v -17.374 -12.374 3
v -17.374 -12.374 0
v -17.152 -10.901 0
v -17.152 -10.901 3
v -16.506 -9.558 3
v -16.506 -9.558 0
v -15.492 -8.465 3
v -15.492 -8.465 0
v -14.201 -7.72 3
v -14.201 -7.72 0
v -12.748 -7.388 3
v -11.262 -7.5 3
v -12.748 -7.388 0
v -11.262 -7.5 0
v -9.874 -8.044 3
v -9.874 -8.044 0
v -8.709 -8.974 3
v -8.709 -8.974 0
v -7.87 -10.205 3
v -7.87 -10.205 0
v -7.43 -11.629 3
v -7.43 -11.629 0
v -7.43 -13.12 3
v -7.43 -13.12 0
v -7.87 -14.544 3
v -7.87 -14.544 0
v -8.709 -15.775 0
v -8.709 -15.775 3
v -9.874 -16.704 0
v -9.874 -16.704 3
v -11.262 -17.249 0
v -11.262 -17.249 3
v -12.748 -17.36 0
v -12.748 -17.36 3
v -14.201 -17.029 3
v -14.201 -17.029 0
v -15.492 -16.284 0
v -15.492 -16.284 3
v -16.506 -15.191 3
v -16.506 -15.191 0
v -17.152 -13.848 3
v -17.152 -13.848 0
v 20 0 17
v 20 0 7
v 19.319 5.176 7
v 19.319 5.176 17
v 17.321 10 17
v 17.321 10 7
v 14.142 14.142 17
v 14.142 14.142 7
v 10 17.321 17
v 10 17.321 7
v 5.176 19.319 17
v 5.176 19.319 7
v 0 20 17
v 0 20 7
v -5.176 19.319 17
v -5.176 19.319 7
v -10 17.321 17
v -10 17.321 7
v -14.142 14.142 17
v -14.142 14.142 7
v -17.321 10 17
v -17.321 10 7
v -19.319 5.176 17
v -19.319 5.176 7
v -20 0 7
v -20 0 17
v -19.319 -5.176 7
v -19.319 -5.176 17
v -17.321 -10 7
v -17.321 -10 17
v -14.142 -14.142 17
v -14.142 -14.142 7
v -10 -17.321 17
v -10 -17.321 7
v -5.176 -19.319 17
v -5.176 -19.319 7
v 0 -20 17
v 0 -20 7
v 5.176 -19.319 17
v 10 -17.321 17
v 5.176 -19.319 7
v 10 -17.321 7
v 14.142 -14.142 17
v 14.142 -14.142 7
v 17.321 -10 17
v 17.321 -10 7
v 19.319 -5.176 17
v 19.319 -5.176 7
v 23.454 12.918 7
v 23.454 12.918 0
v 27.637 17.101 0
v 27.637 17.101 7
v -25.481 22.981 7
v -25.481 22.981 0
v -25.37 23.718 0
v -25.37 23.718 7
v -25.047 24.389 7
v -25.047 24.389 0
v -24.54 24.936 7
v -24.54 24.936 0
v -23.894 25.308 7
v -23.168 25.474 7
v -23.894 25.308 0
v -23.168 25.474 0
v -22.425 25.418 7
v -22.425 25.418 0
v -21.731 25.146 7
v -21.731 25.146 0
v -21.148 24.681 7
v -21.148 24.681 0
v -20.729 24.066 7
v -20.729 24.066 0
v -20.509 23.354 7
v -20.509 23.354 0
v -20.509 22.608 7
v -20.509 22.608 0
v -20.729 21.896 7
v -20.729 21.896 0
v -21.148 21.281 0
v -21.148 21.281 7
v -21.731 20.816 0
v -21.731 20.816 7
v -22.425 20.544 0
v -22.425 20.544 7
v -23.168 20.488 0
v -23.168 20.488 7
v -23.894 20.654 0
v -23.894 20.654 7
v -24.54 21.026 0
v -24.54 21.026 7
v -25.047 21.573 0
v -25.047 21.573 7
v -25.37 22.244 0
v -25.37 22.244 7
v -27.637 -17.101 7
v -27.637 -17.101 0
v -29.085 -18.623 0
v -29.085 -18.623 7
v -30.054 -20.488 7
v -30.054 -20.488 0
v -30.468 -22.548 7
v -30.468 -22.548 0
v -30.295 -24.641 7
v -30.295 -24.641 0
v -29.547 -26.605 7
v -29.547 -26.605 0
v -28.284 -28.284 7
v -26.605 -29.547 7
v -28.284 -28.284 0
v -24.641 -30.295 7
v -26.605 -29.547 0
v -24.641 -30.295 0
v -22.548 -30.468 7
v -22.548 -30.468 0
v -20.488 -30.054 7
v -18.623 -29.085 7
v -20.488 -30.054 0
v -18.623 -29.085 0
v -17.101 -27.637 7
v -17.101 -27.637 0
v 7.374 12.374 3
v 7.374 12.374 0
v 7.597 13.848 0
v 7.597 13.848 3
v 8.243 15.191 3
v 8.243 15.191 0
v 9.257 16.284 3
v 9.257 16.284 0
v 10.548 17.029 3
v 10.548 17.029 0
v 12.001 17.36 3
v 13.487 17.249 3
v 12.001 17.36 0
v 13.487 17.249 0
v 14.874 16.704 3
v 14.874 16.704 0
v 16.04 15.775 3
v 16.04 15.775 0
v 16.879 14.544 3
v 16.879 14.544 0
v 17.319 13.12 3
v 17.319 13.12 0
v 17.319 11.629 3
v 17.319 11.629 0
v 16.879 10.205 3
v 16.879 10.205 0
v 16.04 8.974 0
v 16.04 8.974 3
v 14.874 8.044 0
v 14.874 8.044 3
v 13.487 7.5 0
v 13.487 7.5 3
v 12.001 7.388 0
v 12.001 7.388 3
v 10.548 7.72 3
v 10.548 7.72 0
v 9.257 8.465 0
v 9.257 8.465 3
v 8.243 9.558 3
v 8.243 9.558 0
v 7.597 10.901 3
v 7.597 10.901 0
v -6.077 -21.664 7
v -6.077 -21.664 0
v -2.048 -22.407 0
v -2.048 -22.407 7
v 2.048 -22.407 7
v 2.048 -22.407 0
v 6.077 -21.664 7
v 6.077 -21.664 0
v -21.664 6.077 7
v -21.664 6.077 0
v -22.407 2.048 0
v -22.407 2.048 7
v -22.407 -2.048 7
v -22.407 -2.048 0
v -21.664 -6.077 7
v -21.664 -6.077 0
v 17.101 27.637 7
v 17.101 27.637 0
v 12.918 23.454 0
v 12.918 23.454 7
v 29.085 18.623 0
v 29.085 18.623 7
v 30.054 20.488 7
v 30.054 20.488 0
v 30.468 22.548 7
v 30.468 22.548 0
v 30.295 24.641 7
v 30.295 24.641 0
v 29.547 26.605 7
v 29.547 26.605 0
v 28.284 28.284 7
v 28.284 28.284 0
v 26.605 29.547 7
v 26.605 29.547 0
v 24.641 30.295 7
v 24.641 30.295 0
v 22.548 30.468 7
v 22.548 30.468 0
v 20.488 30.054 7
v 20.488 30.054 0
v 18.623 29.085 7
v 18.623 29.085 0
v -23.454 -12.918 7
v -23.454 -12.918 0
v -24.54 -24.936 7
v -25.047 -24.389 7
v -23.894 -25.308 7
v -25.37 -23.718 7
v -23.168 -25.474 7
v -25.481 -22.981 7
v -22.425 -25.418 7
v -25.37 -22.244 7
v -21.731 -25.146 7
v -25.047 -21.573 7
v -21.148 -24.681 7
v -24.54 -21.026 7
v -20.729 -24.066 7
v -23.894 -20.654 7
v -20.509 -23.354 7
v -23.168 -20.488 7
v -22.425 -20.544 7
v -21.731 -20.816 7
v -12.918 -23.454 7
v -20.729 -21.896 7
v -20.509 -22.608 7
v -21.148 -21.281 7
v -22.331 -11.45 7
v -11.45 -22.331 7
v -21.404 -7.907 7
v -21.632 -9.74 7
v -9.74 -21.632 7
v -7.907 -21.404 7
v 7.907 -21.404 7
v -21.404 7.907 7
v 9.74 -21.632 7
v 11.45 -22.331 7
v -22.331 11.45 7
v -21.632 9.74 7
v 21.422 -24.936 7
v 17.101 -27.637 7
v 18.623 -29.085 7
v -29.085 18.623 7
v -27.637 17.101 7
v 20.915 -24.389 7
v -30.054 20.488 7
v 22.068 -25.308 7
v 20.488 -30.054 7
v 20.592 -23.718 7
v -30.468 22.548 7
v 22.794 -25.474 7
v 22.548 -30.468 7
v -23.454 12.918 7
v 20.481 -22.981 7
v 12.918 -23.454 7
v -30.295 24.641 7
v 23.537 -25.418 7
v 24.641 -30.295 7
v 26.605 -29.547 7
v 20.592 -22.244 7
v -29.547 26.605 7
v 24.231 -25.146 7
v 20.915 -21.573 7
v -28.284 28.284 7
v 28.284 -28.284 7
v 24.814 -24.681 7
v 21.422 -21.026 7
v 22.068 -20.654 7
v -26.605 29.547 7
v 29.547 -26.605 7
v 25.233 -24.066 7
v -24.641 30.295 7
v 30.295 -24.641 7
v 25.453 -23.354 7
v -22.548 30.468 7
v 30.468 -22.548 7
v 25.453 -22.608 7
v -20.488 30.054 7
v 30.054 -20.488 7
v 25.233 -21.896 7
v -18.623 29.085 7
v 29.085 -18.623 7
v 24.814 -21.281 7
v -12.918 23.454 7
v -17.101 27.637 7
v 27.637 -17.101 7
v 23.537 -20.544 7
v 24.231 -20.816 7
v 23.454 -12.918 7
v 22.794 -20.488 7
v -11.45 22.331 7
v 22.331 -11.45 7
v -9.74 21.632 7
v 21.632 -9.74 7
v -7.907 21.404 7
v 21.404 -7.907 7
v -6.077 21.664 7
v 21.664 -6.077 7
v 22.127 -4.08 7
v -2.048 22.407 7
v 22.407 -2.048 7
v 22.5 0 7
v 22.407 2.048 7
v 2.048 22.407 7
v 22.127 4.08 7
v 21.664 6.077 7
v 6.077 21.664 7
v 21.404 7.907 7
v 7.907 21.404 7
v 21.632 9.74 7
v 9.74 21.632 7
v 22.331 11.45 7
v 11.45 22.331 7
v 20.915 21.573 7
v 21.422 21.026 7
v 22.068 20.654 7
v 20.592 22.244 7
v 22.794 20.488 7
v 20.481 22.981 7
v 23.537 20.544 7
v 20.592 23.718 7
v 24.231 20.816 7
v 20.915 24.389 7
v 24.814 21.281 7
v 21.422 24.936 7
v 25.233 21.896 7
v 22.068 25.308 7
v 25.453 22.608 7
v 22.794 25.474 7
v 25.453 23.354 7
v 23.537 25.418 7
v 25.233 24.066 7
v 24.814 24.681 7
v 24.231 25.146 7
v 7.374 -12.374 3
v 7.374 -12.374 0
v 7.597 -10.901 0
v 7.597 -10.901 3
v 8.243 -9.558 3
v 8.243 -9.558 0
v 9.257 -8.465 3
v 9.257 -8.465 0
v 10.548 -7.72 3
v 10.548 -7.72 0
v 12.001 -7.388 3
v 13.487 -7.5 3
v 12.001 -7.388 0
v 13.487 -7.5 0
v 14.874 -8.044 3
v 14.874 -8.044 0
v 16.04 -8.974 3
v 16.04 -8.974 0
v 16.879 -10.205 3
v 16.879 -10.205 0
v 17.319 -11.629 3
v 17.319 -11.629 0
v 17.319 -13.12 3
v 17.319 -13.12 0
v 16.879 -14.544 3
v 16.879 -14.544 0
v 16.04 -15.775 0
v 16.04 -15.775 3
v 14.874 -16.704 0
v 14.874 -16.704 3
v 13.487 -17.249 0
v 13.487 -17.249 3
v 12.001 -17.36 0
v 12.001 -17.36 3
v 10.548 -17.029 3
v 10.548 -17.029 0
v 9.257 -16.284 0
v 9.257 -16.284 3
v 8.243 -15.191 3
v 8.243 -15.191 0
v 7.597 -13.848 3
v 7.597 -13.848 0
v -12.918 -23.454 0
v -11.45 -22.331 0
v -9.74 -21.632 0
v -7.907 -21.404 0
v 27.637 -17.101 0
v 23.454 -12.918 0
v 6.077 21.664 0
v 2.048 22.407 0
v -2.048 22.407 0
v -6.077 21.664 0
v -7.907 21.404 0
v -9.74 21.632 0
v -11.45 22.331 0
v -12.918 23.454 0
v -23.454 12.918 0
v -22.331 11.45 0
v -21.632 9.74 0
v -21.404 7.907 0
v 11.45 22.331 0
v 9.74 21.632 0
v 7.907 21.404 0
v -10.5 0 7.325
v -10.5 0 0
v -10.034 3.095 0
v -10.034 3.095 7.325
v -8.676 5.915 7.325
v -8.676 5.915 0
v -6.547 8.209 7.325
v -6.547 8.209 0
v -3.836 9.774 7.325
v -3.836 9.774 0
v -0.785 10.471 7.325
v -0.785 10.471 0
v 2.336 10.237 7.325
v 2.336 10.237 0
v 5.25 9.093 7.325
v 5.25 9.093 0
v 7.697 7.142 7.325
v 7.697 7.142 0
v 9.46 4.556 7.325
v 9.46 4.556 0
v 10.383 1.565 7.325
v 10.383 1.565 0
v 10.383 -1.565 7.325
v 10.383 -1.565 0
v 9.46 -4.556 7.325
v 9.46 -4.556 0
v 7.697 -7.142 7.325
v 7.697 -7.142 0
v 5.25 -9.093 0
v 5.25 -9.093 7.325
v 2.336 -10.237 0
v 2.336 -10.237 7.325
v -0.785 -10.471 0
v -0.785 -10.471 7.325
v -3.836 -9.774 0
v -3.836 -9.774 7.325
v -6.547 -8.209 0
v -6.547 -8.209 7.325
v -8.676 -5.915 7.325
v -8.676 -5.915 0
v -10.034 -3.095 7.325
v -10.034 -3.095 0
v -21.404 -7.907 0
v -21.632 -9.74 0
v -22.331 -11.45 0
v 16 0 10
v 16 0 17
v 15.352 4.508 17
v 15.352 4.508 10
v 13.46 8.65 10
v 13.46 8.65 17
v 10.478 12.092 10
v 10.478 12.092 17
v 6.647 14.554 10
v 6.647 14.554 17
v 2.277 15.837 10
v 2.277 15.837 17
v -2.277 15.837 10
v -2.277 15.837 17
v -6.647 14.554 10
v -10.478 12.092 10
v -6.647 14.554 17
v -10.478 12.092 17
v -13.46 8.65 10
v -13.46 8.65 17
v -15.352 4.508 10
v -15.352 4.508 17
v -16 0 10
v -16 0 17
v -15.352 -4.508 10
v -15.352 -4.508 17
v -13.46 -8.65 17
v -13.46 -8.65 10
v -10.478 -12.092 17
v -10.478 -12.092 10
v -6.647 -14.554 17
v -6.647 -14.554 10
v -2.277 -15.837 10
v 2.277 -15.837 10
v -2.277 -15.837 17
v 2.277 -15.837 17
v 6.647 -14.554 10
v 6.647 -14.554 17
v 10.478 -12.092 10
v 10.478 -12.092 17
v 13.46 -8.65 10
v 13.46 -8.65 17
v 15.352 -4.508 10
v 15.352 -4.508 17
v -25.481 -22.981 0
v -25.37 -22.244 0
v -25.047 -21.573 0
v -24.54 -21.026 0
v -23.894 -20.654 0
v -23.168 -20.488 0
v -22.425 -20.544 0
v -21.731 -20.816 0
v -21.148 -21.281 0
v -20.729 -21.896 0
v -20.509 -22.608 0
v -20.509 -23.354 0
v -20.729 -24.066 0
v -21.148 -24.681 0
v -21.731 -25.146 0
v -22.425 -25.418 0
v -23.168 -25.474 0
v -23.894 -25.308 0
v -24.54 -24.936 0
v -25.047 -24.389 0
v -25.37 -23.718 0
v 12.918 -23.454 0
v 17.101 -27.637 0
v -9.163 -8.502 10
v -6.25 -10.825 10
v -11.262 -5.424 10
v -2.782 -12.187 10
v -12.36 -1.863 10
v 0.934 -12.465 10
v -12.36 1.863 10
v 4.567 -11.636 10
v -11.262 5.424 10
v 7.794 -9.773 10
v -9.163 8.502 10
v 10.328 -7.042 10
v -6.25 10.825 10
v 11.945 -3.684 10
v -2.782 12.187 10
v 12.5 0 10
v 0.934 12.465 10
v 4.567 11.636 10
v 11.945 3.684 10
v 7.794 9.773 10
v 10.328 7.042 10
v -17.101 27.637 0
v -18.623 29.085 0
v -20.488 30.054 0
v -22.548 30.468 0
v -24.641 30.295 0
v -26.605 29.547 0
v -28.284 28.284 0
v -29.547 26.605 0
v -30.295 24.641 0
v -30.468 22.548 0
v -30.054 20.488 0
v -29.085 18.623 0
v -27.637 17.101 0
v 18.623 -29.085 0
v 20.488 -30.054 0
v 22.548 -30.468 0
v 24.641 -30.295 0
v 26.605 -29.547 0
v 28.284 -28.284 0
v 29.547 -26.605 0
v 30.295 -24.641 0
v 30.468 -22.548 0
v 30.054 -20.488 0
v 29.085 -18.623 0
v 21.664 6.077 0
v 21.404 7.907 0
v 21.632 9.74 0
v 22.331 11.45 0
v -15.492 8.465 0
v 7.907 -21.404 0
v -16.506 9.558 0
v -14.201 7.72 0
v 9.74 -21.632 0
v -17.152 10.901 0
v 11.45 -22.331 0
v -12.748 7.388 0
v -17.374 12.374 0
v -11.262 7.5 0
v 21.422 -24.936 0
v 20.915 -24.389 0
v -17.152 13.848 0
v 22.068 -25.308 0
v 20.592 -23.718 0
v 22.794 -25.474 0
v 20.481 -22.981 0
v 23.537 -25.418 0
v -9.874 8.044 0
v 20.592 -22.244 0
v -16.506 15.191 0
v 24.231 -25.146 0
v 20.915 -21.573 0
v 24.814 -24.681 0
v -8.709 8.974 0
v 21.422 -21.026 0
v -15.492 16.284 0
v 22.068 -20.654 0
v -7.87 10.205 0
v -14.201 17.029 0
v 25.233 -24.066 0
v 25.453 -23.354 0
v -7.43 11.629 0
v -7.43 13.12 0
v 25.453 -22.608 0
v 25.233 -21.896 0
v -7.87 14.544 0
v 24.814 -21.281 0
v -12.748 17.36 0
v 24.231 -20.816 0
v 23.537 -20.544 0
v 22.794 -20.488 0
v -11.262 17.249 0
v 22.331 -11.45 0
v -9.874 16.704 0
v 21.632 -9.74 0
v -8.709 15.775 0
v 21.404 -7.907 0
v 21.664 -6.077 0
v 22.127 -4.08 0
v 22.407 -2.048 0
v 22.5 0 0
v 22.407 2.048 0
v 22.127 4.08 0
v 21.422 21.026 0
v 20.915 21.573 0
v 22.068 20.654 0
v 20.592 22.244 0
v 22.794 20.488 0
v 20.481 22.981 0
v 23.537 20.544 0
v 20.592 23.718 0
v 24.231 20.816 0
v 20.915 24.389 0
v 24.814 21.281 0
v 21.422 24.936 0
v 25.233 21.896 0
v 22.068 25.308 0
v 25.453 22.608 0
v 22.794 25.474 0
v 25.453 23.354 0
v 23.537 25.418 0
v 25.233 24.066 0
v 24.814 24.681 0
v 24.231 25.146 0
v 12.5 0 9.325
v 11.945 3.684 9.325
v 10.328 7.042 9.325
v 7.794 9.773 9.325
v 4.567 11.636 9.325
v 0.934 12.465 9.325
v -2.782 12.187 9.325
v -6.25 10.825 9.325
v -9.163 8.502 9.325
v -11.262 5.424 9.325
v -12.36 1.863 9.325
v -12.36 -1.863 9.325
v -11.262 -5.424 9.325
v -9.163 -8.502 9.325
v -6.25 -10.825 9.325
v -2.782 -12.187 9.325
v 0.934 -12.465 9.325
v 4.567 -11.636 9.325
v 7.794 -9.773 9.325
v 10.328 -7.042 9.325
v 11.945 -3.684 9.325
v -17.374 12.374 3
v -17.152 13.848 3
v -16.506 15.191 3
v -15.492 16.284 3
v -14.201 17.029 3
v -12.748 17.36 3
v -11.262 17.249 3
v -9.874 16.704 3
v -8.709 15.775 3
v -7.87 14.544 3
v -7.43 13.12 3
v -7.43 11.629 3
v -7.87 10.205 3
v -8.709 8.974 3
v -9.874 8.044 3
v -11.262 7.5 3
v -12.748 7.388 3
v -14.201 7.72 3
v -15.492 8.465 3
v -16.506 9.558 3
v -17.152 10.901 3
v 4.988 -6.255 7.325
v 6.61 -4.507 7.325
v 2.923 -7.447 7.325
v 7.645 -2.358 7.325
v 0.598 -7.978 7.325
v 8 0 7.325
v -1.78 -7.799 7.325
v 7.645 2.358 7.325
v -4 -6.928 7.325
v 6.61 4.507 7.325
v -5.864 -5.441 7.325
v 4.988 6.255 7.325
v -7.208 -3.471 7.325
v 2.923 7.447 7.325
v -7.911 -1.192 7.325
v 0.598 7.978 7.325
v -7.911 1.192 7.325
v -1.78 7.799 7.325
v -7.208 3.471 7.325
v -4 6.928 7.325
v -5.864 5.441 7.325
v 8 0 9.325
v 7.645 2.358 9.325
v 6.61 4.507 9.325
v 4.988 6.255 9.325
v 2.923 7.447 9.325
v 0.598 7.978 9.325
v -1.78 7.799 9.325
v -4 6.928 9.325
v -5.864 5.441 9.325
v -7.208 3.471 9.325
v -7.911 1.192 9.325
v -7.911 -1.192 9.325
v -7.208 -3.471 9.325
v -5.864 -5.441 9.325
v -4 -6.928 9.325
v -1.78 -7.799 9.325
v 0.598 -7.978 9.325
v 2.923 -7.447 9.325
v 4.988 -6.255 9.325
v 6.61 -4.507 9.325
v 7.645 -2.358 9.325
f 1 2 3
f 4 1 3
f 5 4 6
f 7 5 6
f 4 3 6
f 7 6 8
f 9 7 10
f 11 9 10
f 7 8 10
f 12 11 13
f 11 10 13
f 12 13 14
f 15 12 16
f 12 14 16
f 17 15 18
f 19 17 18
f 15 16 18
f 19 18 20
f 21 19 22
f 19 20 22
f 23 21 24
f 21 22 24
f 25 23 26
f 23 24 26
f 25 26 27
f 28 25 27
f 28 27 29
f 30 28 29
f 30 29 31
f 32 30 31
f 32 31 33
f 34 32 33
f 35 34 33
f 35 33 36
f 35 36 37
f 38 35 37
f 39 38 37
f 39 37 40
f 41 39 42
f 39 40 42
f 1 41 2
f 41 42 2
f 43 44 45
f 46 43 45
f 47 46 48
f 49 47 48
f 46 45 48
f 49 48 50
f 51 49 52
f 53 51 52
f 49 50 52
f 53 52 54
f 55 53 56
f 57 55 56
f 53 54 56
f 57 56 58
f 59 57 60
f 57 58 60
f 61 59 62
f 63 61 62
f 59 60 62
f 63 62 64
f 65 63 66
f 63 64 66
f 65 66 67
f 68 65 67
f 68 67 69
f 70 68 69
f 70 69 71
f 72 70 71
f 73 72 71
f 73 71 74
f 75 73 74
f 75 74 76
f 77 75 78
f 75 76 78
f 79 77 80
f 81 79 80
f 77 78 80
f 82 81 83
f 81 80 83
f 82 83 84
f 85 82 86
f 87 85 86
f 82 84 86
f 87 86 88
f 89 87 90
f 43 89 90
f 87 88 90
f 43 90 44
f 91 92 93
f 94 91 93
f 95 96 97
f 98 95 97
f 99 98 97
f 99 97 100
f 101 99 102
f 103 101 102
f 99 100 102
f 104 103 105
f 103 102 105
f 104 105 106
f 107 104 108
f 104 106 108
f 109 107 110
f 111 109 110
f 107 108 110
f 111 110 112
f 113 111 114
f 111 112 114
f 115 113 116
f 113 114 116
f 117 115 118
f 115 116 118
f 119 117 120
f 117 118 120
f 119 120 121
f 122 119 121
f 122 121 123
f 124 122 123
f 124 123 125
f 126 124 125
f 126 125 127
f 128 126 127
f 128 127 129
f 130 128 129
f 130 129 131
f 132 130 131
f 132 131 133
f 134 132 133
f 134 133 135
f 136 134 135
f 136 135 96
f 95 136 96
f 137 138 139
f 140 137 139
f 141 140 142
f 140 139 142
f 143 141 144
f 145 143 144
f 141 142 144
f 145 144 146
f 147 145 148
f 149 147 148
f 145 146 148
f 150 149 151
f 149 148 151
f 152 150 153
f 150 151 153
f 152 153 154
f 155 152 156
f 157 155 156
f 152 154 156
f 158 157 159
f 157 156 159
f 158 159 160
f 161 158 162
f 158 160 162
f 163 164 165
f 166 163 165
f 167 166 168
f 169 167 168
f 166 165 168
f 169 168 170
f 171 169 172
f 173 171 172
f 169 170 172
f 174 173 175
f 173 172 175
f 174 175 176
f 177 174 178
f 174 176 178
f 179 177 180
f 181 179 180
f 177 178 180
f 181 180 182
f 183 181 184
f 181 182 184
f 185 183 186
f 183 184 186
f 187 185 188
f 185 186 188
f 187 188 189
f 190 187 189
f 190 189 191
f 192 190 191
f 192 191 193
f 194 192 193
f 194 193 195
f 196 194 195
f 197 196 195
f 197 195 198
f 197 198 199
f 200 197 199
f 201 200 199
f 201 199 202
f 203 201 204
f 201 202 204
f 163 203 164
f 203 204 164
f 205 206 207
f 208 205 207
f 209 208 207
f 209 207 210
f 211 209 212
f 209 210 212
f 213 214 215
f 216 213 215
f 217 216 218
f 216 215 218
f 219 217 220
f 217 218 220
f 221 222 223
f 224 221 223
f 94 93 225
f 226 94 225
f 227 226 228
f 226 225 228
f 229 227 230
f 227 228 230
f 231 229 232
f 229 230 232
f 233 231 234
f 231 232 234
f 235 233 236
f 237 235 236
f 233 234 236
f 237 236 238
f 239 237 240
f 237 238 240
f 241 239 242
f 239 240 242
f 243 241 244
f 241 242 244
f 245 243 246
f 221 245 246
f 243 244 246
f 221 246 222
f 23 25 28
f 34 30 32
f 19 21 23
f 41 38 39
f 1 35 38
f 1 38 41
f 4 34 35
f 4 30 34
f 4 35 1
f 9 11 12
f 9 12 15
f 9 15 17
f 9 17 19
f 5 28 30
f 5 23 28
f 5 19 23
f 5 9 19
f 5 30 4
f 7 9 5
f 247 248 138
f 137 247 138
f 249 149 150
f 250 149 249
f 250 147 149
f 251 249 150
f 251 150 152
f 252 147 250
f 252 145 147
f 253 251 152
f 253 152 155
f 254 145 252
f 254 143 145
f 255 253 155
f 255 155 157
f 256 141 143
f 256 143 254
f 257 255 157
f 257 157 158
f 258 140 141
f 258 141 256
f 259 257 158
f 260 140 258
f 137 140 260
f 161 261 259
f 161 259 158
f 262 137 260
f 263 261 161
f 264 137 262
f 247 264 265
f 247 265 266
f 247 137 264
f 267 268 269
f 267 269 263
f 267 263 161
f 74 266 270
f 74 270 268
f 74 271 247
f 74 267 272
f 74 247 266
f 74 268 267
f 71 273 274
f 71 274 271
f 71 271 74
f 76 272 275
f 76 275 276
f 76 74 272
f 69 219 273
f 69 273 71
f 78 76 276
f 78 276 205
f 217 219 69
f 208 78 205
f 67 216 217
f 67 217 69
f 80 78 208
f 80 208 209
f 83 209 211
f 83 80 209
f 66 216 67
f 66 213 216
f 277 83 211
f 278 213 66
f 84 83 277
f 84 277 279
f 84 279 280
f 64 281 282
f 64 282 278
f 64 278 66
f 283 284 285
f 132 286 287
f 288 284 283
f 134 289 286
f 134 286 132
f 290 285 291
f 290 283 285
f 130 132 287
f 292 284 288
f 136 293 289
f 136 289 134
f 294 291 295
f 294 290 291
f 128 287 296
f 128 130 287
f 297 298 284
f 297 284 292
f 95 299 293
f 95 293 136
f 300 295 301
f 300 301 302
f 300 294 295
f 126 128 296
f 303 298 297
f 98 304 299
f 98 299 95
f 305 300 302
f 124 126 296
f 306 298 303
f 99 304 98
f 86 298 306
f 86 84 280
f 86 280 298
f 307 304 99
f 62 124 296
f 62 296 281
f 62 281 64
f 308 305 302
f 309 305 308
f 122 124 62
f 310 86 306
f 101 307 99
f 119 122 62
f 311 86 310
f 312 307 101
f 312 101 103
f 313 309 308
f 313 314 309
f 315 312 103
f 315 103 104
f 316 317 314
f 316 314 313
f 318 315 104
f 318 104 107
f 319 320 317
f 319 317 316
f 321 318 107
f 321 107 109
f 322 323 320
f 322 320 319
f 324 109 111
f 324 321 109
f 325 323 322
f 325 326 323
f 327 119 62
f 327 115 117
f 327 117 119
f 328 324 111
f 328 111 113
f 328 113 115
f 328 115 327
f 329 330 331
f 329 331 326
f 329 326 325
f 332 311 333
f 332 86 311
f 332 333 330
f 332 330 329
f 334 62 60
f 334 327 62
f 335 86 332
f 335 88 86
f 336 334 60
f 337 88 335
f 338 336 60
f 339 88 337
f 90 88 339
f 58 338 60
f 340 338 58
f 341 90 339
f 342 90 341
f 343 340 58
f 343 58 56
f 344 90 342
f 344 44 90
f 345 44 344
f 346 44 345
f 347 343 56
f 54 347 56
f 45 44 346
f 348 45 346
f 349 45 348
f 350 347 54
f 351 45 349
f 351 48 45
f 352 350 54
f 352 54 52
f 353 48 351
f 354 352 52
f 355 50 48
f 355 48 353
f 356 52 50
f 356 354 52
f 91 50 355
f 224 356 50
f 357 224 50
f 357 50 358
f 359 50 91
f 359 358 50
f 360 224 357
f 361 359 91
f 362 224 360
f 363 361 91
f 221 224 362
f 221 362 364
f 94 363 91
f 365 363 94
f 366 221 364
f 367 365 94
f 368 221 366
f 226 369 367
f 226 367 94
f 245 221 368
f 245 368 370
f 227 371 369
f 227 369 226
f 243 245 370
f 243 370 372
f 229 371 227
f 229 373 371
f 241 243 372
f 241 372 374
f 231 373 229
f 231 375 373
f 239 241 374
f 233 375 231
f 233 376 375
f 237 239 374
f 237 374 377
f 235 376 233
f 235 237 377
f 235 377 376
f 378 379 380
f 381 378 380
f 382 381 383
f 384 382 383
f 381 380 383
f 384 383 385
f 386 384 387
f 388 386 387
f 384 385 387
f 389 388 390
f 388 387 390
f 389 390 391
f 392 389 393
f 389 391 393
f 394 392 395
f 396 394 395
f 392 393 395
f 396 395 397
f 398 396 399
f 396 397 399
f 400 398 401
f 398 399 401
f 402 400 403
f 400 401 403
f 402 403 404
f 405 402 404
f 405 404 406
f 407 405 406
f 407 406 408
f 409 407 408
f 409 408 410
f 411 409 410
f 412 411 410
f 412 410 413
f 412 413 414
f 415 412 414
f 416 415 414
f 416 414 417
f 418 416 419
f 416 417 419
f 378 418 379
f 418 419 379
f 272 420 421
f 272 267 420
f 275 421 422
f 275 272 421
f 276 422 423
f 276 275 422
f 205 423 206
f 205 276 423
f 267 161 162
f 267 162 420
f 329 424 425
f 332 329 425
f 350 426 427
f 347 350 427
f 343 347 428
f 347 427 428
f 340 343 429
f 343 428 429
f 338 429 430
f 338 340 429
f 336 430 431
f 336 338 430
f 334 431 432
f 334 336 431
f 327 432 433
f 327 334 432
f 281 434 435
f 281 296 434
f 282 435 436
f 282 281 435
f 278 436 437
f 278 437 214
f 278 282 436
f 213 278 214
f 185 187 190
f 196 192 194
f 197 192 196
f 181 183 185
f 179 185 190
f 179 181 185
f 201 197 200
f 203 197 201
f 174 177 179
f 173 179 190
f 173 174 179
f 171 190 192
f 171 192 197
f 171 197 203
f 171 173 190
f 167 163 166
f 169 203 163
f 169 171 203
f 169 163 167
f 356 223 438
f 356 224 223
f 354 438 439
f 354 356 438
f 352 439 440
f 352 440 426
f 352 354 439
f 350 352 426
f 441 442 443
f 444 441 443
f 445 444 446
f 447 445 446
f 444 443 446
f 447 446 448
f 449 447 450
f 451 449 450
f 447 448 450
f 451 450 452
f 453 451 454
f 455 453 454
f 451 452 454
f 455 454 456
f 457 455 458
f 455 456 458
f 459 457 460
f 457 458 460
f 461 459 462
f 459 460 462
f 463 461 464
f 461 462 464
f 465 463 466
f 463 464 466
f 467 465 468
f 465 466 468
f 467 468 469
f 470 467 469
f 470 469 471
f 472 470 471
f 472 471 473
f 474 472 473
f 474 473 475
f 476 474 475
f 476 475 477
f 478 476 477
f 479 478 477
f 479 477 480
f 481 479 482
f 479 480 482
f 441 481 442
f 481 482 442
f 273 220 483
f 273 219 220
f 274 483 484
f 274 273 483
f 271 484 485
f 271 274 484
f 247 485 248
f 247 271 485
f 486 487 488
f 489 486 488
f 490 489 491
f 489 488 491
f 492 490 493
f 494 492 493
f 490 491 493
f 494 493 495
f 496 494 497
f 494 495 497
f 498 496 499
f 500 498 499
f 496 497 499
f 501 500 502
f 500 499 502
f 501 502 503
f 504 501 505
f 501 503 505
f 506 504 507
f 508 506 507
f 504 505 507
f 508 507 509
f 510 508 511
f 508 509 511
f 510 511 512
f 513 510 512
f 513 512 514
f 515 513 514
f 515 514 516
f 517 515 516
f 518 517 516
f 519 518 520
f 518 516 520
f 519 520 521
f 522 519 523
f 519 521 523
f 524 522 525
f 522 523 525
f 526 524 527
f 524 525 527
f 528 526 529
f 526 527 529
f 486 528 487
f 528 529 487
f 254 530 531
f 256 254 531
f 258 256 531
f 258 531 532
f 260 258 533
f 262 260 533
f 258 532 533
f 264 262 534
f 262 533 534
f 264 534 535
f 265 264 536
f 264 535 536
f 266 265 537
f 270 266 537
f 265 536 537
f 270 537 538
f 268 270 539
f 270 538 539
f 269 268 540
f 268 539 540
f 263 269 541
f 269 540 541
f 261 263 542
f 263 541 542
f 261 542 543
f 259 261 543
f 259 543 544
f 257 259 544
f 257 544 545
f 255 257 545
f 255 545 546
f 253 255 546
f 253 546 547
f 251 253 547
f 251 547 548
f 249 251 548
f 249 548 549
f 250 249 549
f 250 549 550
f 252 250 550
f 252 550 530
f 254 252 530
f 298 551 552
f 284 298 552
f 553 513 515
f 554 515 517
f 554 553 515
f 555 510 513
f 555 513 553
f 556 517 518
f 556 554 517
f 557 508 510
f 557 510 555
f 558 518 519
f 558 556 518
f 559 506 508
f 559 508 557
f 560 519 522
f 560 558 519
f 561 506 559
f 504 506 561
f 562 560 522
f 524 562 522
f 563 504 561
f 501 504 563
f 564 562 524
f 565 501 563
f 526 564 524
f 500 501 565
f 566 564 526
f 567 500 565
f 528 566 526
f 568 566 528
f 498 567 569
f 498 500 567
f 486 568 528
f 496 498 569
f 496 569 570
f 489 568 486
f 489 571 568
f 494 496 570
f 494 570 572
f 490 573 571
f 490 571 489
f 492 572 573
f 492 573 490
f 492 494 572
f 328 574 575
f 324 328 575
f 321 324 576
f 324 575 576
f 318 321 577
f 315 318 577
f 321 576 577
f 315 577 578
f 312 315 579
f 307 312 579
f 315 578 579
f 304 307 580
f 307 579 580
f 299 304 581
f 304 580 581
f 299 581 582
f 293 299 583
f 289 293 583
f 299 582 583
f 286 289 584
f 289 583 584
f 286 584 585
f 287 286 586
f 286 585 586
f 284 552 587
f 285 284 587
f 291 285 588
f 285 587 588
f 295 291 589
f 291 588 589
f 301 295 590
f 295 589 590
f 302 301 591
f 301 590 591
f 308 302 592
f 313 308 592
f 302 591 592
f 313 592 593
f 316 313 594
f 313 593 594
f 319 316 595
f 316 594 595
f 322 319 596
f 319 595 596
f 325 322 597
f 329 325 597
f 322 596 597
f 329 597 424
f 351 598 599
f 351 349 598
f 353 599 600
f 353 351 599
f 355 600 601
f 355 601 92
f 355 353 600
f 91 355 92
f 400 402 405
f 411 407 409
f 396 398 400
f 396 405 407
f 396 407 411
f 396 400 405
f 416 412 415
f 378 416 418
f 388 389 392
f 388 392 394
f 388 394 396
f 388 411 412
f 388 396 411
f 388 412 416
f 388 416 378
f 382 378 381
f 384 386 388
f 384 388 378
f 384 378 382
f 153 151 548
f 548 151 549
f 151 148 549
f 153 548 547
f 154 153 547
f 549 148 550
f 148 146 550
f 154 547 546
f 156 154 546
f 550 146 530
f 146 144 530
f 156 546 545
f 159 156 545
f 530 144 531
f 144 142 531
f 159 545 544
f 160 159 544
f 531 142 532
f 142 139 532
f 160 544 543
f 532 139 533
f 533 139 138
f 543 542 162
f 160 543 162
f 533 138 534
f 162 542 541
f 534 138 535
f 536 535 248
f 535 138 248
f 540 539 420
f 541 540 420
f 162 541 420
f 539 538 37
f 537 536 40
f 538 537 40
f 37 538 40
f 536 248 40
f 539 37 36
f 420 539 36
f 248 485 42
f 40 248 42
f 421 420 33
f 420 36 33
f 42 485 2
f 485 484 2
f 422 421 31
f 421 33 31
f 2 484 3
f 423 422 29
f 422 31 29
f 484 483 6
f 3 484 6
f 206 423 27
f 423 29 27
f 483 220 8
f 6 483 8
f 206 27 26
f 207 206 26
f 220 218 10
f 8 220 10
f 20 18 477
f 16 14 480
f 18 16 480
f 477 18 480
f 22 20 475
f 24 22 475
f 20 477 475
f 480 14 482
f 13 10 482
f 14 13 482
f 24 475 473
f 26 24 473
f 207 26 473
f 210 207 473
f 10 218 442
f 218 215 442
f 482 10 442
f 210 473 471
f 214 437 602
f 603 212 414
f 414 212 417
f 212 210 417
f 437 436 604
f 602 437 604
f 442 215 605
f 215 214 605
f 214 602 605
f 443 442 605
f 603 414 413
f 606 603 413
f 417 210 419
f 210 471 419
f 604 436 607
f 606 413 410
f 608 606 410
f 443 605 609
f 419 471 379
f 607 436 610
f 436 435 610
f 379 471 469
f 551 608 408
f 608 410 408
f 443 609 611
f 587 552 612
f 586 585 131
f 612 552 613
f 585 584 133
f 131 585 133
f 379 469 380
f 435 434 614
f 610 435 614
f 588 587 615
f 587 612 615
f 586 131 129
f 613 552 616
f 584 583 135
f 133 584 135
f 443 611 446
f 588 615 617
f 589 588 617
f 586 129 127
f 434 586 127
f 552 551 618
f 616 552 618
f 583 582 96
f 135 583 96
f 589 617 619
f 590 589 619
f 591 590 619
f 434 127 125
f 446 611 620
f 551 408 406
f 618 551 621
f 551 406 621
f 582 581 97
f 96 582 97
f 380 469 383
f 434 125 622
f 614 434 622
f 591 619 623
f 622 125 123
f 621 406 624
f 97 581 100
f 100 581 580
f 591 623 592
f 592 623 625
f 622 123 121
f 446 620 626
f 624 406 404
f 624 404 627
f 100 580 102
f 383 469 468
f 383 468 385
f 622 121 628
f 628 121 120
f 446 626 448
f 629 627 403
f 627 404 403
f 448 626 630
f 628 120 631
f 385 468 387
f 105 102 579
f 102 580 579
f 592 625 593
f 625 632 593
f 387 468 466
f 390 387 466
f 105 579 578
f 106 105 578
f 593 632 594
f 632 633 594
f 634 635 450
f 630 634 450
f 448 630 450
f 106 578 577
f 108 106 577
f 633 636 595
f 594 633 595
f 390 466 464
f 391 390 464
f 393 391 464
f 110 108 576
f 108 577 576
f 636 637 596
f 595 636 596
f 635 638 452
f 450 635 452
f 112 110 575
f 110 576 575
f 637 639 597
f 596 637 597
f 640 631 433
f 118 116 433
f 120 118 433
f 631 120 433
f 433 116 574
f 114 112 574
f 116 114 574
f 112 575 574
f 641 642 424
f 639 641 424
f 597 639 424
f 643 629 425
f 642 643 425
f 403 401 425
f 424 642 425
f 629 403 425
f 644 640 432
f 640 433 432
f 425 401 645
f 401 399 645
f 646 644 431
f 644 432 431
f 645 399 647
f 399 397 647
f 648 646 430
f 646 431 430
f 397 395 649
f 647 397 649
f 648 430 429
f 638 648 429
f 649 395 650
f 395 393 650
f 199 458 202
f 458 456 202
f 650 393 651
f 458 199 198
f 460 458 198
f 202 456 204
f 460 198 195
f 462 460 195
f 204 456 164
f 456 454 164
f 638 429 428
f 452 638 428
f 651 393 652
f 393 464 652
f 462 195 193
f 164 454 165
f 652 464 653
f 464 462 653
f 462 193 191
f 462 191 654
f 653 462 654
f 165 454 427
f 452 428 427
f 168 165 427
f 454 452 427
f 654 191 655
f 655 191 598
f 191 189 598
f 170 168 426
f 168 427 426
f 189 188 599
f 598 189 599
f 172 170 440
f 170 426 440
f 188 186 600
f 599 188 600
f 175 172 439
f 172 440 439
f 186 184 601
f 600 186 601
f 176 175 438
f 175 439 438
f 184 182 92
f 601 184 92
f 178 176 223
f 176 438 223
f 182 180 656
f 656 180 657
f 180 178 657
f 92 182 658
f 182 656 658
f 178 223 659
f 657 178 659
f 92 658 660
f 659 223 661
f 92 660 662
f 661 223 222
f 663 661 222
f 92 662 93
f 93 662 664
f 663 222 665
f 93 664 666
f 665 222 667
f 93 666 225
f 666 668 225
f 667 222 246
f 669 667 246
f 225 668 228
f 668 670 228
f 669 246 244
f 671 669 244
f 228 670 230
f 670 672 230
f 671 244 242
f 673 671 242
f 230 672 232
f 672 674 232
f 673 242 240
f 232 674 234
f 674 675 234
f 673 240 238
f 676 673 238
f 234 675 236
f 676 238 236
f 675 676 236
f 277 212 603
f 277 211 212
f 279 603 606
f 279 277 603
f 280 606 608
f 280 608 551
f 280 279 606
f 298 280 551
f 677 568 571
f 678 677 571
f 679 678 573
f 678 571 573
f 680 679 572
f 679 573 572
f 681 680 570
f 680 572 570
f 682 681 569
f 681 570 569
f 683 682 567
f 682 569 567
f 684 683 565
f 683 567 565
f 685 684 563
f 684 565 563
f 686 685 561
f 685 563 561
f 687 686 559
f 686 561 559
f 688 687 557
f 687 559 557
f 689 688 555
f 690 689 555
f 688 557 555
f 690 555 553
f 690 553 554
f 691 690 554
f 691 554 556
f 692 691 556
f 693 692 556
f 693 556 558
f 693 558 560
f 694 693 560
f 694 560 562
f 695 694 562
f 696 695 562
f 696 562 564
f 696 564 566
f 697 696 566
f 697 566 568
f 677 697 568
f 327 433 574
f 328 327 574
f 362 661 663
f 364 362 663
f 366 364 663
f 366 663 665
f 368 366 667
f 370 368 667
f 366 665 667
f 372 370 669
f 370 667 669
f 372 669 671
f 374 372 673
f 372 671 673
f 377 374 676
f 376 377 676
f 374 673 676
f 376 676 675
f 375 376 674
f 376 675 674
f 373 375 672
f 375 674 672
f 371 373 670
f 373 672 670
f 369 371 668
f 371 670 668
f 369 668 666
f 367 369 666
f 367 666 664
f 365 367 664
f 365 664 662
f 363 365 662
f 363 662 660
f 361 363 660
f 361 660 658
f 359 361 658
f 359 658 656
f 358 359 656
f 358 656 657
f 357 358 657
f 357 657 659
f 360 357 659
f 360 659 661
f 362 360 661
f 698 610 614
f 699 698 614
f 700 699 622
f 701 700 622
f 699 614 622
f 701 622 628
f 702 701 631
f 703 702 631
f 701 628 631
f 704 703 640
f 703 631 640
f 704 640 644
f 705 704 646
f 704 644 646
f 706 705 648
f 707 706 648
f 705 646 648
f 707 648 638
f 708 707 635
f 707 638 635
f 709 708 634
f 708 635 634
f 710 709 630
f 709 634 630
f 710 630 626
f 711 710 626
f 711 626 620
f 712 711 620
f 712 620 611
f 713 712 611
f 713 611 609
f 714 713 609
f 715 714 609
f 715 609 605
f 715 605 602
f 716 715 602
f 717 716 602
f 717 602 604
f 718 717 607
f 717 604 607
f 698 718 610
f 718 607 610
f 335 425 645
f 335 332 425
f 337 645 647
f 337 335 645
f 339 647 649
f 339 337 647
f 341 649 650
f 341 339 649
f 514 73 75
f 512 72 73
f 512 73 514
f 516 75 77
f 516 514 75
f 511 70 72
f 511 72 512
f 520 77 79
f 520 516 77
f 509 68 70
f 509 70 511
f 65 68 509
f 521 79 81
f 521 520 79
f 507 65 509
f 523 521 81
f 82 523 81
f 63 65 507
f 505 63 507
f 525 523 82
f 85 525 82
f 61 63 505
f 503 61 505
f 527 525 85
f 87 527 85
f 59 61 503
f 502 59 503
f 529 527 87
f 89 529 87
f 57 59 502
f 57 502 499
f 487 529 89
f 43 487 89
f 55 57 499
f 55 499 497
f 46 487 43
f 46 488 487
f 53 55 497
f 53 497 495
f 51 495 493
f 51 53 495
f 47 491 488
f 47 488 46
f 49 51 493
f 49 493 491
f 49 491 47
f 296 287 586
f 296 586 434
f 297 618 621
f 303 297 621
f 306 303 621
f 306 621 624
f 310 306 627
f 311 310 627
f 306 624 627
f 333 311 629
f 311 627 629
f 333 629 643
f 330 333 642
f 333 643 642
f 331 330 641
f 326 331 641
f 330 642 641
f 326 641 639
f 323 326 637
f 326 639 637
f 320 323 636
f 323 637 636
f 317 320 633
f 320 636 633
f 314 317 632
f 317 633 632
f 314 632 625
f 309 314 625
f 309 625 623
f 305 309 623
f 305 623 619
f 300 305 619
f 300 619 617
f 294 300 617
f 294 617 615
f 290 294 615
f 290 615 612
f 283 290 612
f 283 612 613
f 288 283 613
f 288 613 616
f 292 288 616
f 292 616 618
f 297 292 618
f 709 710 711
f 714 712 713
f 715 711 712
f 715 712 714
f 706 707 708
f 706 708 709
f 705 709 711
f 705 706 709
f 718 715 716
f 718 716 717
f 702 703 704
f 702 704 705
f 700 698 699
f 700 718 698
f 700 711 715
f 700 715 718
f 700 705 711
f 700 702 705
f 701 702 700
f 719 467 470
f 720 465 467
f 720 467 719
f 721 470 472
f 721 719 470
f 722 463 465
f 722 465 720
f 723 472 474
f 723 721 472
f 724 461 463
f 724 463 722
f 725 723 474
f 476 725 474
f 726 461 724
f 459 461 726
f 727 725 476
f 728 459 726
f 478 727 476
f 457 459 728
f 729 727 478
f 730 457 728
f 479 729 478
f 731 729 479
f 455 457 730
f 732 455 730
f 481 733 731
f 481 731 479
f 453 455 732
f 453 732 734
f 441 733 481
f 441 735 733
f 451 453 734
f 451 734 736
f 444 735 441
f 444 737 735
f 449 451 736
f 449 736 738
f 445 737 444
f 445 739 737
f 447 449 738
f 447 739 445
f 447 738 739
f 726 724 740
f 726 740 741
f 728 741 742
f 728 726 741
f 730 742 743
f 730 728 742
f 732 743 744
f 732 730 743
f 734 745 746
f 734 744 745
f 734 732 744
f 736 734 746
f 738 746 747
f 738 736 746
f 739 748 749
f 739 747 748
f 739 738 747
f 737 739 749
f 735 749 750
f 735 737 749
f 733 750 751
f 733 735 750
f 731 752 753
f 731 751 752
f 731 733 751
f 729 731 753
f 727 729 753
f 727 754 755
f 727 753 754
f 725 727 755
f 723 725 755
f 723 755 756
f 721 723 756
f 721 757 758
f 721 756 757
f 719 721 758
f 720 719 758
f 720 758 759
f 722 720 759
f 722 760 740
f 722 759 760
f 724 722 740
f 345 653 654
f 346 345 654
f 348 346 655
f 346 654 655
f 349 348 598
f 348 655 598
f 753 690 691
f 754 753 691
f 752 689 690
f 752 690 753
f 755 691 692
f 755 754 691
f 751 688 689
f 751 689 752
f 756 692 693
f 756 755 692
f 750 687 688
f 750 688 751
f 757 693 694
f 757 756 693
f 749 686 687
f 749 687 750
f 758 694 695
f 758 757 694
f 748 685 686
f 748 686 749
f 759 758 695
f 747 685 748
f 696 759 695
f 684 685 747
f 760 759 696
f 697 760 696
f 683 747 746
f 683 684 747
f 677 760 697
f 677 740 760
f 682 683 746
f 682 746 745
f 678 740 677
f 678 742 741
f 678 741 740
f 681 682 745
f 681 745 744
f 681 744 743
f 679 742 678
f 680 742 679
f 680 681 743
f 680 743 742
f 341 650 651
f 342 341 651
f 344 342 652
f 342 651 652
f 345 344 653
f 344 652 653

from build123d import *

# Parameters (mm, degrees)
SKETCH1_R                             = 7.5
SKETCH1_R_2                           = 22.5
F_5_IN_SHEET_DEPTH                    = 7
FILLET1_R                             = 7
F_5_0_REAMED_OVER_FOR_SHOULDER_BOLT_D = 5
SKETCH8_R                             = 20
BOSS_EXTRUDE2_DEPTH                   = 10
SKETCH2_R                             = 8
THROUGH_HOLE_DEPTH                    = 47.337664072
SKETCH7_R                             = 10.5
INBOARD_BEARING_CUP_DEPTH             = 7.325
SKETCH11_R                            = 12.5
CUT_EXTRUDE5_DEPTH                    = 7.675
SKETCH12_R                            = 16
CUT_EXTRUDE6_DEPTH                    = 7
SKETCH13_R                            = 5
CUT_EXTRUDE7_DEPTH                    = 3


with BuildPart() as part:
    # Sketch1 → .5 in sheet (new body)
    with BuildSketch(Plane.XY):
        with Locations((22.980970389, 22.980970389)):
            Circle(SKETCH1_R)
        Circle(SKETCH1_R_2)
        with Locations((-22.980970389, 22.980970389)):
            Circle(SKETCH1_R)
        with Locations((-22.980970389, -22.980970389)):
            Circle(SKETCH1_R)
        with Locations((22.980970389, -22.980970389)):
            Circle(SKETCH1_R)
        with BuildLine():
            ThreePointArc((-17.10117153, 27.636930588), (-28.284271247, 28.284271247), (-27.636930588, 17.10117153))
            Line((-27.636930588, 17.10117153), (-17.10117153, 27.636930588))
        make_face()
        with BuildLine():
            Line((-17.10117153, 27.636930588), (-27.636930588, 17.10117153))
            ThreePointArc((-27.636930588, 17.10117153), (-19.715216379, 16.229314981), (-15.480970389, 22.980970389))
            ThreePointArc((-15.480970389, 22.980970389), (-15.897592259, 25.445874906), (-17.10117153, 27.636930588))
        make_face()
        with BuildLine():
            Line((-27.636930588, 17.10117153), (-20.280355849, 9.744596791))
            ThreePointArc((-20.280355849, 9.744596791), (-15.909902577, 15.909902577), (-9.744596791, 20.280355849))
            Line((-9.744596791, 20.280355849), (-17.10117153, 27.636930588))
            ThreePointArc((-17.10117153, 27.636930588), (-15.897592259, 25.445874906), (-15.480970389, 22.980970389))
            ThreePointArc((-15.480970389, 22.980970389), (-19.715216379, 16.229314981), (-27.636930588, 17.10117153))
        make_face()
        with BuildLine():
            Line((-20.280355849, 9.744596791), (-10.535759058, 0))
            Line((-10.535759058, 0), (0, 10.535759058))
            Line((0, 10.535759058), (-9.744596791, 20.280355849))
            ThreePointArc((-9.744596791, 20.280355849), (-15.909902577, 15.909902577), (-20.280355849, 9.744596791))
        make_face()
        with BuildLine():
            Line((-9.744596791, 20.280355849), (0, 10.535759058))
            Line((0, 10.535759058), (9.744596791, 20.280355849))
            ThreePointArc((9.744596791, 20.280355849), (0, 22.5), (-9.744596791, 20.280355849))
        make_face()
        with BuildLine():
            Line((-20.280355849, -9.744596791), (-10.535759058, 0))
            Line((-10.535759058, 0), (-20.280355849, 9.744596791))
            ThreePointArc((-20.280355849, 9.744596791), (-22.5, 0), (-20.280355849, -9.744596791))
        make_face()
        with BuildLine():
            ThreePointArc((-9.744596791, -20.280355849), (0, -22.5), (9.744596791, -20.280355849))
            Line((9.744596791, -20.280355849), (0, -10.535759058))
            Line((0, -10.535759058), (-9.744596791, -20.280355849))
        make_face()
        with BuildLine():
            Line((0, -10.535759058), (9.744596791, -20.280355849))
            ThreePointArc((9.744596791, -20.280355849), (15.909902577, -15.909902577), (20.280355849, -9.744596791))
            Line((20.280355849, -9.744596791), (10.535759058, 0))
            Line((10.535759058, 0), (0, -10.535759058))
        make_face()
        with BuildLine():
            Line((10.535759058, 0), (20.280355849, -9.744596791))
            ThreePointArc((20.280355849, -9.744596791), (21.938072005, -4.997098828), (22.5, 0))
            ThreePointArc((22.5, 0), (21.938072005, 4.997098828), (20.280355849, 9.744596791))
            Line((20.280355849, 9.744596791), (10.535759058, 0))
        make_face()
        with BuildLine():
            Line((0, 10.535759058), (10.535759058, 0))
            Line((10.535759058, 0), (20.280355849, 9.744596791))
            ThreePointArc((20.280355849, 9.744596791), (15.909902577, 15.909902577), (9.744596791, 20.280355849))
            Line((9.744596791, 20.280355849), (0, 10.535759058))
        make_face()
        Polygon((-10.535759058, 0), (0, -10.535759058), (10.535759058, 0), (0, 10.535759058), align=None)
        with BuildLine():
            ThreePointArc((17.10117153, 27.636930588), (17.67766953, 17.67766953), (27.636930588, 17.10117153))
            Line((27.636930588, 17.10117153), (17.10117153, 27.636930588))
        make_face()
        with BuildLine():
            Line((17.10117153, 27.636930588), (27.636930588, 17.10117153))
            ThreePointArc((27.636930588, 17.10117153), (29.732625796, 19.715216379), (30.480970389, 22.980970389))
            ThreePointArc((30.480970389, 22.980970389), (25.445874906, 30.064348518), (17.10117153, 27.636930588))
        make_face()
        with BuildLine():
            ThreePointArc((9.744596791, 20.280355849), (15.909902577, 15.909902577), (20.280355849, 9.744596791))
            Line((20.280355849, 9.744596791), (27.636930588, 17.10117153))
            ThreePointArc((27.636930588, 17.10117153), (17.67766953, 17.67766953), (17.10117153, 27.636930588))
            Line((17.10117153, 27.636930588), (9.744596791, 20.280355849))
        make_face()
        with BuildLine():
            ThreePointArc((27.636930588, -17.10117153), (17.67766953, -17.67766953), (17.10117153, -27.636930588))
            Line((17.10117153, -27.636930588), (27.636930588, -17.10117153))
        make_face()
        with BuildLine():
            Line((27.636930588, -17.10117153), (17.10117153, -27.636930588))
            ThreePointArc((17.10117153, -27.636930588), (25.445874906, -30.064348518), (30.480970389, -22.980970389))
            ThreePointArc((30.480970389, -22.980970389), (29.732625796, -19.715216379), (27.636930588, -17.10117153))
        make_face()
        with BuildLine():
            Line((9.744596791, -20.280355849), (17.10117153, -27.636930588))
            ThreePointArc((17.10117153, -27.636930588), (17.67766953, -17.67766953), (27.636930588, -17.10117153))
            Line((27.636930588, -17.10117153), (20.280355849, -9.744596791))
            ThreePointArc((20.280355849, -9.744596791), (15.909902577, -15.909902577), (9.744596791, -20.280355849))
        make_face()
        with BuildLine():
            ThreePointArc((-27.636930588, -17.10117153), (-28.284271247, -28.284271247), (-17.10117153, -27.636930588))
            Line((-17.10117153, -27.636930588), (-27.636930588, -17.10117153))
        make_face()
        with BuildLine():
            Line((-27.636930588, -17.10117153), (-17.10117153, -27.636930588))
            ThreePointArc((-17.10117153, -27.636930588), (-15.897592259, -25.445874906), (-15.480970389, -22.980970389))
            ThreePointArc((-15.480970389, -22.980970389), (-19.715216379, -16.229314981), (-27.636930588, -17.10117153))
        make_face()
        with BuildLine():
            Line((-17.10117153, -27.636930588), (-9.744596791, -20.280355849))
            ThreePointArc((-9.744596791, -20.280355849), (-15.909902577, -15.909902577), (-20.280355849, -9.744596791))
            Line((-20.280355849, -9.744596791), (-27.636930588, -17.10117153))
            ThreePointArc((-27.636930588, -17.10117153), (-19.715216379, -16.229314981), (-15.480970389, -22.980970389))
            ThreePointArc((-15.480970389, -22.980970389), (-15.897592259, -25.445874906), (-17.10117153, -27.636930588))
        make_face()
    extrude(amount=F_5_IN_SHEET_DEPTH)

    # Fillet1
    fillet1_edges = [part.edges().sort_by_distance(p)[0] for p in [
        (-9.744596791, -20.280355849, 3.5),
        (-20.280355849, -9.744596791, 3.5),
        (-20.280355849, 9.744596791, 3.5),
        (-9.744596791, 20.280355849, 3.5),
        (9.744596791, 20.280355849, 3.5),
        (20.280355849, 9.744596791, 3.5),
        (20.280355849, -9.744596791, 3.5),
        (9.744596791, -20.280355849, 3.5),
    ]]
    fillet(fillet1_edges, radius=FILLET1_R)

    # Ø5.0 Reamed over for shoulder bolt (through all)
    with Locations(Plane(origin=(-11.055401524, 12.777106872, 7), x_dir=(1, 0, 0), z_dir=(0, 0, 1))):
        with Locations((-11.925568864, 10.203863517), (34.036371913, 10.203863517), (34.036371913, -35.758077261), (-11.925568864, -35.758077261)):
            Hole(F_5_0_REAMED_OVER_FOR_SHOULDER_BOLT_D / 2)

    # Sketch8 → Boss-Extrude2 (add)
    with BuildSketch(Plane.XY.offset(7)):
        Circle(SKETCH8_R)
    extrude(amount=BOSS_EXTRUDE2_DEPTH)

    # Sketch2 → Through hole (cut, through all)
    with BuildSketch(Plane.XY):
        Circle(SKETCH2_R)
    extrude(amount=THROUGH_HOLE_DEPTH, mode=Mode.SUBTRACT)

    # Sketch7 → Inboard bearing cup (cut)
    with BuildSketch(Plane(origin=(0, 0, 0), x_dir=(-1, 0, 0), z_dir=(0, 0, -1))):
        Circle(SKETCH7_R)
    extrude(amount=-INBOARD_BEARING_CUP_DEPTH, mode=Mode.SUBTRACT)

    # Sketch11 → Cut-Extrude5 (cut)
    with BuildSketch(Plane.XY.offset(17)):
        Circle(SKETCH11_R)
    extrude(amount=-CUT_EXTRUDE5_DEPTH, mode=Mode.SUBTRACT)

    # Sketch12 → Cut-Extrude6 (cut)
    with BuildSketch(Plane.XY.offset(17)):
        Circle(SKETCH12_R)
    extrude(amount=-CUT_EXTRUDE6_DEPTH, mode=Mode.SUBTRACT)

    # Sketch13 → Cut-Extrude7 (cut)
    with BuildSketch(Plane(origin=(0, 0, 0), x_dir=(-1, 0, 0), z_dir=(0, 0, -1))):
        with Locations((12.374368671, 12.374368671)):
            Circle(SKETCH13_R)
        with Locations((-12.374368671, 12.374368671)):
            Circle(SKETCH13_R)
        with Locations((-12.374368671, -12.374368671)):
            Circle(SKETCH13_R)
        with Locations((12.374368671, -12.374368671)):
            Circle(SKETCH13_R)
    extrude(amount=-CUT_EXTRUDE7_DEPTH, mode=Mode.SUBTRACT)


solid = part.part
